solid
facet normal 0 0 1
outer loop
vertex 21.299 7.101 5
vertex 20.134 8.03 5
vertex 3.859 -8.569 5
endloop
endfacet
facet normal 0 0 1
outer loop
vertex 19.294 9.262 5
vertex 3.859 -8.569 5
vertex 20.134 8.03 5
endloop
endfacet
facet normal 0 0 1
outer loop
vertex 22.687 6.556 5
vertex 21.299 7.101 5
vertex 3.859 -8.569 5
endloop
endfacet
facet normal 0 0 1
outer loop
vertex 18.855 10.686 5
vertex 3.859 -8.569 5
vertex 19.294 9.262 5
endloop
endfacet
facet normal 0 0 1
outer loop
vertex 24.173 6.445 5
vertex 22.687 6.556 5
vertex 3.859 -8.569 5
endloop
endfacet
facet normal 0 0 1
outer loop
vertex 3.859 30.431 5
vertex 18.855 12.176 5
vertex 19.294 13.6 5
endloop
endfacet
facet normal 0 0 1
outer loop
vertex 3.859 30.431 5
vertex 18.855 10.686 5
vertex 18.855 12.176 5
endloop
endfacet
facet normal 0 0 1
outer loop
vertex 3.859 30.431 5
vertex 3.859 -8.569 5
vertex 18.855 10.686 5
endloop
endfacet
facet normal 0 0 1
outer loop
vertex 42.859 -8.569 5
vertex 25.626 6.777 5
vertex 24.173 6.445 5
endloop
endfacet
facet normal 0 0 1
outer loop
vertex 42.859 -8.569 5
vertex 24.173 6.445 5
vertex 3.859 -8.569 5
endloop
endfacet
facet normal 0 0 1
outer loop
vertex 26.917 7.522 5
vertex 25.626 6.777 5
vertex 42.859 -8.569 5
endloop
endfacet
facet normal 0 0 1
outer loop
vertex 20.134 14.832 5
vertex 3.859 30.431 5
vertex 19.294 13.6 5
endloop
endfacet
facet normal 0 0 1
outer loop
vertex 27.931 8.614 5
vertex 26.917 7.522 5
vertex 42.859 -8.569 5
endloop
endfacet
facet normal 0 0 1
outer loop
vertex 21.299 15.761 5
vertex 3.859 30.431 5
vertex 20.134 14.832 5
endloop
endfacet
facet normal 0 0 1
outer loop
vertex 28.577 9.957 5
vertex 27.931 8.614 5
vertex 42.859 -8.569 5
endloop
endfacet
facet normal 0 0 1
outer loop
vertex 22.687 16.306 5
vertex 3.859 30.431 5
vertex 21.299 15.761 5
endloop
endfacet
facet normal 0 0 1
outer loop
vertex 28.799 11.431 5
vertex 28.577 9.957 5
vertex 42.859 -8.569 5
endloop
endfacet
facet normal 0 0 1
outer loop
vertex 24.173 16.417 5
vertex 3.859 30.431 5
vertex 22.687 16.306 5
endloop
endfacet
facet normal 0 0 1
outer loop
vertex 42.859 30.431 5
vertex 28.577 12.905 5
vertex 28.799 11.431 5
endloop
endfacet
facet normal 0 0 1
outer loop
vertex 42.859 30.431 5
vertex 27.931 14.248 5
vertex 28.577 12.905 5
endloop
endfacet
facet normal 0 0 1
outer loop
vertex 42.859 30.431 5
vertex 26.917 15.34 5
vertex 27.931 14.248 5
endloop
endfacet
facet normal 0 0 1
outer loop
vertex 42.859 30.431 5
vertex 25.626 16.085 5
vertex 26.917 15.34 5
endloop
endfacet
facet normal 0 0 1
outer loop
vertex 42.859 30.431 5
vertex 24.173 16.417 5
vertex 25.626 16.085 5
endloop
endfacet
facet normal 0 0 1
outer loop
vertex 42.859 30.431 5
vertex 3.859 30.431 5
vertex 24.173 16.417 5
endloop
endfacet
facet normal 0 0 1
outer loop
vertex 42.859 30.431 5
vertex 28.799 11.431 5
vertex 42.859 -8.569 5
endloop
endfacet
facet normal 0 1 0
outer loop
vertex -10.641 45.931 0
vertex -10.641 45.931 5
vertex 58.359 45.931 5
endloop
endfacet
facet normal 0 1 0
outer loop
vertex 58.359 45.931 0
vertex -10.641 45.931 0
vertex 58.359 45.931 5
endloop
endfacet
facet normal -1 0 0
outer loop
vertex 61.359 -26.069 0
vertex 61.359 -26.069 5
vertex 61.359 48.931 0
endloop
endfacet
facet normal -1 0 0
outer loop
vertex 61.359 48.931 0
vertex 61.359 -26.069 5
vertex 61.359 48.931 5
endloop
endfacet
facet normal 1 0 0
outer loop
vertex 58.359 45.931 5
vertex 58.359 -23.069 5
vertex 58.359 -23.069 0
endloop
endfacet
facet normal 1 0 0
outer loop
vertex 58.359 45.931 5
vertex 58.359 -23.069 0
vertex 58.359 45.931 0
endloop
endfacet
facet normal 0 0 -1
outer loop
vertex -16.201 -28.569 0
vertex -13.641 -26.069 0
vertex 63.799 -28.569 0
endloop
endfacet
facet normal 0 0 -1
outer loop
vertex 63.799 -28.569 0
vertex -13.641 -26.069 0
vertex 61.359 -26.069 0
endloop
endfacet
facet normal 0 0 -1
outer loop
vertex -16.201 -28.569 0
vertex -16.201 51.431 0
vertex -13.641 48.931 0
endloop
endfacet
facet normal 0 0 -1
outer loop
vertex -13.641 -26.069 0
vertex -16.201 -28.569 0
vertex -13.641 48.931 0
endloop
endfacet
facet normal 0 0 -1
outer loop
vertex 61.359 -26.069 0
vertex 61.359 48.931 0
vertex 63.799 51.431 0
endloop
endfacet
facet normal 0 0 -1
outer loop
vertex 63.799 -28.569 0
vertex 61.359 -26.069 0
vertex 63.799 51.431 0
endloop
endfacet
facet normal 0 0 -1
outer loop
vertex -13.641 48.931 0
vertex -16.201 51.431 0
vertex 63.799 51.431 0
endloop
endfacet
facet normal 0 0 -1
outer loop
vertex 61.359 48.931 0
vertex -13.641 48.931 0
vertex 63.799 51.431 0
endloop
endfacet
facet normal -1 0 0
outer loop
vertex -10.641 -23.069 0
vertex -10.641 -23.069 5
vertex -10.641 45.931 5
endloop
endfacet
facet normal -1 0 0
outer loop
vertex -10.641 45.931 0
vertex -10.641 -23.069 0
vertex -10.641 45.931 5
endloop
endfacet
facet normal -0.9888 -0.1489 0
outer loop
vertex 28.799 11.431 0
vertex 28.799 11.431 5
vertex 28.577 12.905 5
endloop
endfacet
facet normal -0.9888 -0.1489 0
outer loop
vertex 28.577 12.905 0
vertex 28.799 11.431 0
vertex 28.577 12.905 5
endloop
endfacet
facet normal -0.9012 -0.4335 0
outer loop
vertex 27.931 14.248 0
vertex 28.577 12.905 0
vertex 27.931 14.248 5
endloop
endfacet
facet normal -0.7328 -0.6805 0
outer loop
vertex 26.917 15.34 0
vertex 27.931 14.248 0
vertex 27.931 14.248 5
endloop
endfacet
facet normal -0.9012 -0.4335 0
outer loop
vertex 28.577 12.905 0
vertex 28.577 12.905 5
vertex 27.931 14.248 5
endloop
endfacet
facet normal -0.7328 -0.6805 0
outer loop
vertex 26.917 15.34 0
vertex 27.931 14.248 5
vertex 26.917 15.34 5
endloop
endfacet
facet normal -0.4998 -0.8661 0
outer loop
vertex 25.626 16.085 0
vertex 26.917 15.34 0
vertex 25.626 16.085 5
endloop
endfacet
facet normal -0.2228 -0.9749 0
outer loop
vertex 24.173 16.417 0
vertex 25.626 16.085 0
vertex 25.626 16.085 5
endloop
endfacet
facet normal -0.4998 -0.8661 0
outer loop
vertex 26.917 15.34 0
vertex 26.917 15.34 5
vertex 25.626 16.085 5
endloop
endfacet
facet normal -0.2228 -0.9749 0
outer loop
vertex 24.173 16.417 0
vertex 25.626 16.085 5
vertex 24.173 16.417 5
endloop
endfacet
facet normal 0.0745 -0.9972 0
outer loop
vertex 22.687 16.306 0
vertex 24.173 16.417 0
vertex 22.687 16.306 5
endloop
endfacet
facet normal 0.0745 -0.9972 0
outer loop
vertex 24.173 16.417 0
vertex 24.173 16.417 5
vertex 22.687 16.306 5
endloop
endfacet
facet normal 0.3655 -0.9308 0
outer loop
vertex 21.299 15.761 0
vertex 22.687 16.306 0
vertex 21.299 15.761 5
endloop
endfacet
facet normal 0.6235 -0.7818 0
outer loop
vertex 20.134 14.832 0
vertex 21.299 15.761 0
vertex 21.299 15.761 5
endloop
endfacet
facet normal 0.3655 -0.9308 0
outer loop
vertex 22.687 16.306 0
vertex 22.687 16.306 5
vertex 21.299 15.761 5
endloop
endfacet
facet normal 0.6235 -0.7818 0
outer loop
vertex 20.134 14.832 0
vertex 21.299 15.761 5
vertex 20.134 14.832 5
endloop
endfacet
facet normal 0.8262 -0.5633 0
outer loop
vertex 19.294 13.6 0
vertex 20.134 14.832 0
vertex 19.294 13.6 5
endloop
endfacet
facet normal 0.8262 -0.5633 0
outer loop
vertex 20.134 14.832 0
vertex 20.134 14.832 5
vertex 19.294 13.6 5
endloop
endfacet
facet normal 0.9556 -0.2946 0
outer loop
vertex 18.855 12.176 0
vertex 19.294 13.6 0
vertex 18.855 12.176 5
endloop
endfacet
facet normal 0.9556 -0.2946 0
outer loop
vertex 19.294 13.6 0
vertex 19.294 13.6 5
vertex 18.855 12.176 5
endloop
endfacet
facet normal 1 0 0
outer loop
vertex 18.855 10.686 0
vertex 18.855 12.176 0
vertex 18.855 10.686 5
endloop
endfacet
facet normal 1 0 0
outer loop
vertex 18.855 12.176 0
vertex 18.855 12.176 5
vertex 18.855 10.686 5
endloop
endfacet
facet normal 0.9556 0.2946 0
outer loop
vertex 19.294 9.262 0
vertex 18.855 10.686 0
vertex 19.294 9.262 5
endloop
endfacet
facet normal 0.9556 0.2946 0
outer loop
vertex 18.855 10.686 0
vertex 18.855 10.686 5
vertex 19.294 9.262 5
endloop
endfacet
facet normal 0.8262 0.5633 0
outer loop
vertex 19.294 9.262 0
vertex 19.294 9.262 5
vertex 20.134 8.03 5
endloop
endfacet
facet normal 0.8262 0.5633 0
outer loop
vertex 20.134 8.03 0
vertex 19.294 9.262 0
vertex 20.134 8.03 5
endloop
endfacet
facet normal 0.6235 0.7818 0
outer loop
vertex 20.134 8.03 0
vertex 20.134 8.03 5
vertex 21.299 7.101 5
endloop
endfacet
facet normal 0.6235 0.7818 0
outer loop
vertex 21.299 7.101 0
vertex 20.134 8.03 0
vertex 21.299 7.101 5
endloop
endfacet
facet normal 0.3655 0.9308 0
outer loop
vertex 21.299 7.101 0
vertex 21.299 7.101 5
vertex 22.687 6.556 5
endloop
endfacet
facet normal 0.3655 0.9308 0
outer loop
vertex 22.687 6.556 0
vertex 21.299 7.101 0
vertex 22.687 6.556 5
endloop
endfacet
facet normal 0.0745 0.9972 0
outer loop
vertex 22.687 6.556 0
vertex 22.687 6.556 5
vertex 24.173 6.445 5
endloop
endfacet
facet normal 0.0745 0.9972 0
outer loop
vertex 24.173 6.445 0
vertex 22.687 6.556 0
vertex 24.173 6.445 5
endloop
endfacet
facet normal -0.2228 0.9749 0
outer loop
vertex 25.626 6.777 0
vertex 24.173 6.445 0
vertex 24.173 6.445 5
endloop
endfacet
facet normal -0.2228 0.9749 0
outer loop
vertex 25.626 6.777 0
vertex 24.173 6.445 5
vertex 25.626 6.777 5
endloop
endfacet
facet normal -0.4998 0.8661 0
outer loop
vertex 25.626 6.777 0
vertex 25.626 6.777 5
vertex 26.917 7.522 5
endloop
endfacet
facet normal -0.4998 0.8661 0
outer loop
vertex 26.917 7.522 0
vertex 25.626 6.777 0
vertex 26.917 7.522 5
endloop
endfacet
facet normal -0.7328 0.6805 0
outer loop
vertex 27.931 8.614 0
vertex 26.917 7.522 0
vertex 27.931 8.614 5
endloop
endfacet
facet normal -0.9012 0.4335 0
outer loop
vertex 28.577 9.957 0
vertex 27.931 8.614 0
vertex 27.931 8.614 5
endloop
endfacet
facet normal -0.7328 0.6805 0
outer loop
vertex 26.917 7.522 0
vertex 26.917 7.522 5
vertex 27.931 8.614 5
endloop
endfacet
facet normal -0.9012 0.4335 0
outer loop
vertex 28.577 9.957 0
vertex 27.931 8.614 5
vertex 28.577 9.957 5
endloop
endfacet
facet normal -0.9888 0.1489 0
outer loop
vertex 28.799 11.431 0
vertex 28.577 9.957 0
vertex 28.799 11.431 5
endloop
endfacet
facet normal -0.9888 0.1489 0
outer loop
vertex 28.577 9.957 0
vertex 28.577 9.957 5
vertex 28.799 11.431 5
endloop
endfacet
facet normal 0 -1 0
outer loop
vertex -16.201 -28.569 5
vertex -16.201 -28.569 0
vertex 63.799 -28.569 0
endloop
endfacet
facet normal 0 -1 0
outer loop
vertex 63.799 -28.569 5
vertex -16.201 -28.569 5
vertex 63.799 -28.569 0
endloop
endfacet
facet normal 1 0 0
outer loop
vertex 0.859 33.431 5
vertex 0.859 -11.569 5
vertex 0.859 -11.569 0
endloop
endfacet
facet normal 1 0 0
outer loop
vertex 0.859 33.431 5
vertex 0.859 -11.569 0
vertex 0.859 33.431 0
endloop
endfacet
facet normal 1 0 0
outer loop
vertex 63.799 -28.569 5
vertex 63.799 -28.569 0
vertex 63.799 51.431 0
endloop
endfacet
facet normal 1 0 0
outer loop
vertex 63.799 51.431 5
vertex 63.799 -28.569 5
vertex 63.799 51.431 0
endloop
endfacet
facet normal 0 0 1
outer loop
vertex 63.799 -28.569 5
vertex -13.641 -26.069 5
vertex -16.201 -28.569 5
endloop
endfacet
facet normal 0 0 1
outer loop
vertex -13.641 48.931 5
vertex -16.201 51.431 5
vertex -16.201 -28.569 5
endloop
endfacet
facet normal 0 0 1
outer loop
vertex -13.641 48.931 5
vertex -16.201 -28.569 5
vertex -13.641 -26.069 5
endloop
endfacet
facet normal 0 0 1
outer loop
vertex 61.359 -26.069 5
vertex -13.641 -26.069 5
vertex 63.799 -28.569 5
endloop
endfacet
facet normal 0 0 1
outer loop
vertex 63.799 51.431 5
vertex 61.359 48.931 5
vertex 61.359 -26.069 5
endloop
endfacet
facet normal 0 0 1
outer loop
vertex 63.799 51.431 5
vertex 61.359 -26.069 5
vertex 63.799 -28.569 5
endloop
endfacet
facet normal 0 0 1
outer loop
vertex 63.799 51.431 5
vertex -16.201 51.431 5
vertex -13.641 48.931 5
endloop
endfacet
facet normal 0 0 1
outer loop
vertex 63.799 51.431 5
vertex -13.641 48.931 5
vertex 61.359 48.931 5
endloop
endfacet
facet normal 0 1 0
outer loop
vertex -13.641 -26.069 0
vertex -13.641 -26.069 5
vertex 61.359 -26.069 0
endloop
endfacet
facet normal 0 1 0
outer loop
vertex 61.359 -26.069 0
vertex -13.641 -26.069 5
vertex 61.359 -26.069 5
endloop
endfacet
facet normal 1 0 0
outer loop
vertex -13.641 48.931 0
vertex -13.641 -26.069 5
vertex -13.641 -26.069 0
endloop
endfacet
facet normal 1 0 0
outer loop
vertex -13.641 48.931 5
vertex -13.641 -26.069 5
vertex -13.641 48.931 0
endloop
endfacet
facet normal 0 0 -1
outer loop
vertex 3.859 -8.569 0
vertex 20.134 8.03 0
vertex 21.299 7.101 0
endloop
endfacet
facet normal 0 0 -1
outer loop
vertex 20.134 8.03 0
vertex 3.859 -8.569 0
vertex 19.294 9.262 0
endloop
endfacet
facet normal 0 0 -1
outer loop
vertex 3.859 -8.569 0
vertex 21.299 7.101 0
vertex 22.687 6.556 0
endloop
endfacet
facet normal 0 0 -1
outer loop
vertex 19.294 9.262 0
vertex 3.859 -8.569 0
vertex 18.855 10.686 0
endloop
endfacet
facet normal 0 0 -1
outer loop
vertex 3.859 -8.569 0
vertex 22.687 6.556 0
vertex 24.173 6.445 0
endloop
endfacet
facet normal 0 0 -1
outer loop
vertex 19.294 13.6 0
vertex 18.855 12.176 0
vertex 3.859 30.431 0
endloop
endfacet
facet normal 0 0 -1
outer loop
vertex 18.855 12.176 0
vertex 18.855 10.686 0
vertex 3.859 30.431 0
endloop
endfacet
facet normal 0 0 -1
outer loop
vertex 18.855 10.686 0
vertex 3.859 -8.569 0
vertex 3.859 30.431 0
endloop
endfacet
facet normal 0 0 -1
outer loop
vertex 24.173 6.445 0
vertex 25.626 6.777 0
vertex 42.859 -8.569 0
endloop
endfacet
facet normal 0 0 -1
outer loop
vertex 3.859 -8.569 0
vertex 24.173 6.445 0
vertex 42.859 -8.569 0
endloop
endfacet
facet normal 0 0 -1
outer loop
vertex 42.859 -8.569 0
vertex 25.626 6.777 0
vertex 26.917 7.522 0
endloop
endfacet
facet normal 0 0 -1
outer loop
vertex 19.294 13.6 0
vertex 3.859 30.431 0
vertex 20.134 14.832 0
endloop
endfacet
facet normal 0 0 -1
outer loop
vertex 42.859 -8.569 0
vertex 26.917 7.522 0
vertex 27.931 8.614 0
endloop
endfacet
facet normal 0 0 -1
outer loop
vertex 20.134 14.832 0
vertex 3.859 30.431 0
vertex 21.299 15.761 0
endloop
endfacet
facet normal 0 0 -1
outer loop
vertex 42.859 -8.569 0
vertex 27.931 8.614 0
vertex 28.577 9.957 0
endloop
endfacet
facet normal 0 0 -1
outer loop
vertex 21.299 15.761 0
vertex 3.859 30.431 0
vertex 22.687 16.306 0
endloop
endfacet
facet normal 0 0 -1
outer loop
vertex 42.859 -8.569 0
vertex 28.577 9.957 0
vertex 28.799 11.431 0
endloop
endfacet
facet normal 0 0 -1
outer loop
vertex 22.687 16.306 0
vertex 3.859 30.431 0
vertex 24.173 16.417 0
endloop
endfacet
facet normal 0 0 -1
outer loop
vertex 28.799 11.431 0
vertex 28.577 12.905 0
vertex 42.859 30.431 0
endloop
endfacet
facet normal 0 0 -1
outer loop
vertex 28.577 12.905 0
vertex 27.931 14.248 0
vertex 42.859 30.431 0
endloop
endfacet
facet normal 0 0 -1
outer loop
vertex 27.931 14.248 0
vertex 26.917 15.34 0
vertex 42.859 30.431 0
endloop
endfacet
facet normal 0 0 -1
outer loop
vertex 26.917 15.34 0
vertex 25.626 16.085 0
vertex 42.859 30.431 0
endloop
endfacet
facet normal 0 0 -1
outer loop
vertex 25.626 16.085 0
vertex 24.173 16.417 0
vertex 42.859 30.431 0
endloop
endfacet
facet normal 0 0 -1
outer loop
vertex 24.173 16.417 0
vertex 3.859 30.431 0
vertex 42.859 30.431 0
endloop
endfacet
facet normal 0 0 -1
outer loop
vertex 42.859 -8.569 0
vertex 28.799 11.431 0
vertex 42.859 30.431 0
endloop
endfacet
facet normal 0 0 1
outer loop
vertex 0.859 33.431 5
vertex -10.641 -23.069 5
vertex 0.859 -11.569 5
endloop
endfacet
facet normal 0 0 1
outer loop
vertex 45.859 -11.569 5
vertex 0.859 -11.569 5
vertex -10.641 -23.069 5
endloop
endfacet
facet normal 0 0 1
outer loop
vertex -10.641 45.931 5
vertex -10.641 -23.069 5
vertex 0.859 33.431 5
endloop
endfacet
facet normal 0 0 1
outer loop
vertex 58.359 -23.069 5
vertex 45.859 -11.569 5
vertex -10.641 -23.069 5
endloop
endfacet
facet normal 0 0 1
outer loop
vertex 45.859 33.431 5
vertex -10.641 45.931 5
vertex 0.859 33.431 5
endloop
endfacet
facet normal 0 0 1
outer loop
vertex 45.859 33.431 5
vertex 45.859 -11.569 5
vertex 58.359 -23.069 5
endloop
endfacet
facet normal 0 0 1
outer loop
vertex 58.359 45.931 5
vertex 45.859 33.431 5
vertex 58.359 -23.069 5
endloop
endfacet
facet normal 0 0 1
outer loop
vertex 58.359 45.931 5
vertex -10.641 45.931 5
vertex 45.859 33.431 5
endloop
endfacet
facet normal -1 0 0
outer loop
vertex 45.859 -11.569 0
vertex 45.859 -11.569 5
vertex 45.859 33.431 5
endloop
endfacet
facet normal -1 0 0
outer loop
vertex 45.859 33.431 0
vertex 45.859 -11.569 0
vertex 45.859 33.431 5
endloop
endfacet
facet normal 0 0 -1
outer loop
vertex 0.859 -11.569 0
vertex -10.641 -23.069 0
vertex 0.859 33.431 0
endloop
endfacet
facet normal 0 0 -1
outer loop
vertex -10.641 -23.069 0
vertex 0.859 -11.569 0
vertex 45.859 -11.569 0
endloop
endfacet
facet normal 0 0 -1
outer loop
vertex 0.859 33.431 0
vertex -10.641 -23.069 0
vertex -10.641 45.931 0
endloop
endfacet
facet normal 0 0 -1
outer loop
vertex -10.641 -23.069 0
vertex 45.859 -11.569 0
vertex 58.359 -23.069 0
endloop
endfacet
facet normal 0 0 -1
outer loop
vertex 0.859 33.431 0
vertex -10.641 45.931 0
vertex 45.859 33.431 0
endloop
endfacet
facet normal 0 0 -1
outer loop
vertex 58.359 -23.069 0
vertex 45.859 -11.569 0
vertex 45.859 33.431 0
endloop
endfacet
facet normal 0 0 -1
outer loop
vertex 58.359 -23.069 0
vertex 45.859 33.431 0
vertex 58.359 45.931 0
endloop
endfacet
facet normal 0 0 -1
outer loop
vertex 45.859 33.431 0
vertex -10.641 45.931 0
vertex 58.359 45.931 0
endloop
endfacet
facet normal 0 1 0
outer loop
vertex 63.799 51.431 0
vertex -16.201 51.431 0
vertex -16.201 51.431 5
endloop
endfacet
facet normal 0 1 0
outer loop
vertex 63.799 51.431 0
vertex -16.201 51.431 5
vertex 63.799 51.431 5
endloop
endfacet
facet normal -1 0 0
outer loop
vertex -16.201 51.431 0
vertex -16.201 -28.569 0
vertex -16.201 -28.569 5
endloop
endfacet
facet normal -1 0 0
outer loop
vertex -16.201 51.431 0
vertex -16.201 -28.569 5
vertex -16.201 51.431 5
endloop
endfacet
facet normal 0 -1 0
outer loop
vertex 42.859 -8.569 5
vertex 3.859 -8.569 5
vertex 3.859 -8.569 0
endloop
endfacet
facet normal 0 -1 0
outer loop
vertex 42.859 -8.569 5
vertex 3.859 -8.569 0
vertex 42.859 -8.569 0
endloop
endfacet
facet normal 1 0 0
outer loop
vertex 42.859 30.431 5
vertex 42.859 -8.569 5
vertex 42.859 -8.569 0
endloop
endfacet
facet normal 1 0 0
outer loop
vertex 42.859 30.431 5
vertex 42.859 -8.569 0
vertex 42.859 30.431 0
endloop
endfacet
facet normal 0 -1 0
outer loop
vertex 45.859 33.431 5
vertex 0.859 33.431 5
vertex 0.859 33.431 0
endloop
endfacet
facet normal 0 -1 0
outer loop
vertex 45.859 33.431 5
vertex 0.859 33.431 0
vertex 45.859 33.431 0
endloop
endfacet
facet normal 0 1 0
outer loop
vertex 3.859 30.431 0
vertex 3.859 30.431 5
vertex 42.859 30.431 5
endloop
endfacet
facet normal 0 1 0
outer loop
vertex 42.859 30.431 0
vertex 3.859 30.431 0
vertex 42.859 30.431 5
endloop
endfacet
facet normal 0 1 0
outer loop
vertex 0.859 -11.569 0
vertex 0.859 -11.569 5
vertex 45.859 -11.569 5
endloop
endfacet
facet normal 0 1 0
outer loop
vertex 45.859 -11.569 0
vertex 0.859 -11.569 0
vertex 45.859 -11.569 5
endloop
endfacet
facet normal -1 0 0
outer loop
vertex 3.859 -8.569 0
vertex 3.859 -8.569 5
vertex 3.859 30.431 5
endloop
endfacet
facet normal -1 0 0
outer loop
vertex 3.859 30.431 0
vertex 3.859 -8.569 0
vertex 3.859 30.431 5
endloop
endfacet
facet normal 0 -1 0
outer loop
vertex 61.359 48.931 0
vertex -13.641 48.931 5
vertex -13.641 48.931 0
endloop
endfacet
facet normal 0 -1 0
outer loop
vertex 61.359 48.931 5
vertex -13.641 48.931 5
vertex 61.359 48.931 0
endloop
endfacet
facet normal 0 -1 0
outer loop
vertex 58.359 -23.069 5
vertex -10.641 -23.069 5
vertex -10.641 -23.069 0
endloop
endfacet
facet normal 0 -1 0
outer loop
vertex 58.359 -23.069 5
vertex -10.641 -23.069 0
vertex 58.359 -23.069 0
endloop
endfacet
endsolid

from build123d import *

# Parameters (mm, degrees)
F0_W      = 80
F0_H      = 80
F1_DEPTH  = 5
F2_R      = 5
F3_DEPTH  = 5
F4_W      = 75
F4_H      = 3
F5_DEPTH  = 20
F6_W      = 3
F6_H      = 75
F7_DEPTH  = 25
F8_W      = 75
F8_H      = 3
F9_DEPTH  = 25
F10_W     = 3
F10_H     = 75
F11_DEPTH = 25
F12_W     = 45
F12_H     = 3
F13_DEPTH = 25
F14_W     = 3
F14_H     = 45
F15_DEPTH = 25
F16_W     = 45
F16_H     = 3
F17_DEPTH = 25
F18_W     = 3
F18_H     = 45
F19_DEPTH = 25


with BuildPart() as f1:
    # F0 (on Top) → F1 (new body)
    with BuildSketch(Plane.XY):
        with Locations((23.799344, 11.43092)):
            Rectangle(F0_W, F0_H)
    extrude(amount=F1_DEPTH)

    # F2 (on face) → F3 (cut)
    with BuildSketch(Plane.XY.offset(5)):
        with Locations((23.799344, 11.43092)):
            Circle(F2_R)
    extrude(amount=-F3_DEPTH, mode=Mode.SUBTRACT)

    # F4 (on face) → F5 (cut)
    with BuildSketch(Plane.XY.offset(5)):
        with Locations((23.859344, 47.43092)):
            Rectangle(F4_W, F4_H)
    extrude(amount=-F5_DEPTH, mode=Mode.SUBTRACT)

    # F6 (on face) → F7 (cut)
    with BuildSketch(Plane.XY.offset(5)):
        with Locations((-12.140656, 11.43092)):
            Rectangle(F6_W, F6_H)
    extrude(amount=-F7_DEPTH, mode=Mode.SUBTRACT)

    # F8 (on face) → F9 (cut)
    with BuildSketch(Plane.XY.offset(5)):
        with Locations((23.859344, -24.56908)):
            Rectangle(F8_W, F8_H)
    extrude(amount=-F9_DEPTH, mode=Mode.SUBTRACT)

    # F10 (on face) → F11 (cut)
    with BuildSketch(Plane.XY.offset(5)):
        with Locations((59.859344, 11.43092)):
            Rectangle(F10_W, F10_H)
    extrude(amount=-F11_DEPTH, mode=Mode.SUBTRACT)

    # F12 (on face) → F13 (cut)
    with BuildSketch(Plane.XY.offset(5)):
        with Locations((23.359344, 31.93092)):
            Rectangle(F12_W, F12_H)
    extrude(amount=-F13_DEPTH, mode=Mode.SUBTRACT)

    # F14 (on face) → F15 (cut)
    with BuildSketch(Plane.XY.offset(5)):
        with Locations((2.359344, 10.93092)):
            Rectangle(F14_W, F14_H)
    extrude(amount=-F15_DEPTH, mode=Mode.SUBTRACT)

    # F16 (on face) → F17 (cut)
    with BuildSketch(Plane.XY.offset(5)):
        with Locations((23.359344, -10.06908)):
            Rectangle(F16_W, F16_H)
    extrude(amount=-F17_DEPTH, mode=Mode.SUBTRACT)

    # F18 (on face) → F19 (cut)
    with BuildSketch(Plane.XY.offset(5)):
        with Locations((44.359344, 10.93092)):
            Rectangle(F18_W, F18_H)
    extrude(amount=-F19_DEPTH, mode=Mode.SUBTRACT)


solid = f1.part
